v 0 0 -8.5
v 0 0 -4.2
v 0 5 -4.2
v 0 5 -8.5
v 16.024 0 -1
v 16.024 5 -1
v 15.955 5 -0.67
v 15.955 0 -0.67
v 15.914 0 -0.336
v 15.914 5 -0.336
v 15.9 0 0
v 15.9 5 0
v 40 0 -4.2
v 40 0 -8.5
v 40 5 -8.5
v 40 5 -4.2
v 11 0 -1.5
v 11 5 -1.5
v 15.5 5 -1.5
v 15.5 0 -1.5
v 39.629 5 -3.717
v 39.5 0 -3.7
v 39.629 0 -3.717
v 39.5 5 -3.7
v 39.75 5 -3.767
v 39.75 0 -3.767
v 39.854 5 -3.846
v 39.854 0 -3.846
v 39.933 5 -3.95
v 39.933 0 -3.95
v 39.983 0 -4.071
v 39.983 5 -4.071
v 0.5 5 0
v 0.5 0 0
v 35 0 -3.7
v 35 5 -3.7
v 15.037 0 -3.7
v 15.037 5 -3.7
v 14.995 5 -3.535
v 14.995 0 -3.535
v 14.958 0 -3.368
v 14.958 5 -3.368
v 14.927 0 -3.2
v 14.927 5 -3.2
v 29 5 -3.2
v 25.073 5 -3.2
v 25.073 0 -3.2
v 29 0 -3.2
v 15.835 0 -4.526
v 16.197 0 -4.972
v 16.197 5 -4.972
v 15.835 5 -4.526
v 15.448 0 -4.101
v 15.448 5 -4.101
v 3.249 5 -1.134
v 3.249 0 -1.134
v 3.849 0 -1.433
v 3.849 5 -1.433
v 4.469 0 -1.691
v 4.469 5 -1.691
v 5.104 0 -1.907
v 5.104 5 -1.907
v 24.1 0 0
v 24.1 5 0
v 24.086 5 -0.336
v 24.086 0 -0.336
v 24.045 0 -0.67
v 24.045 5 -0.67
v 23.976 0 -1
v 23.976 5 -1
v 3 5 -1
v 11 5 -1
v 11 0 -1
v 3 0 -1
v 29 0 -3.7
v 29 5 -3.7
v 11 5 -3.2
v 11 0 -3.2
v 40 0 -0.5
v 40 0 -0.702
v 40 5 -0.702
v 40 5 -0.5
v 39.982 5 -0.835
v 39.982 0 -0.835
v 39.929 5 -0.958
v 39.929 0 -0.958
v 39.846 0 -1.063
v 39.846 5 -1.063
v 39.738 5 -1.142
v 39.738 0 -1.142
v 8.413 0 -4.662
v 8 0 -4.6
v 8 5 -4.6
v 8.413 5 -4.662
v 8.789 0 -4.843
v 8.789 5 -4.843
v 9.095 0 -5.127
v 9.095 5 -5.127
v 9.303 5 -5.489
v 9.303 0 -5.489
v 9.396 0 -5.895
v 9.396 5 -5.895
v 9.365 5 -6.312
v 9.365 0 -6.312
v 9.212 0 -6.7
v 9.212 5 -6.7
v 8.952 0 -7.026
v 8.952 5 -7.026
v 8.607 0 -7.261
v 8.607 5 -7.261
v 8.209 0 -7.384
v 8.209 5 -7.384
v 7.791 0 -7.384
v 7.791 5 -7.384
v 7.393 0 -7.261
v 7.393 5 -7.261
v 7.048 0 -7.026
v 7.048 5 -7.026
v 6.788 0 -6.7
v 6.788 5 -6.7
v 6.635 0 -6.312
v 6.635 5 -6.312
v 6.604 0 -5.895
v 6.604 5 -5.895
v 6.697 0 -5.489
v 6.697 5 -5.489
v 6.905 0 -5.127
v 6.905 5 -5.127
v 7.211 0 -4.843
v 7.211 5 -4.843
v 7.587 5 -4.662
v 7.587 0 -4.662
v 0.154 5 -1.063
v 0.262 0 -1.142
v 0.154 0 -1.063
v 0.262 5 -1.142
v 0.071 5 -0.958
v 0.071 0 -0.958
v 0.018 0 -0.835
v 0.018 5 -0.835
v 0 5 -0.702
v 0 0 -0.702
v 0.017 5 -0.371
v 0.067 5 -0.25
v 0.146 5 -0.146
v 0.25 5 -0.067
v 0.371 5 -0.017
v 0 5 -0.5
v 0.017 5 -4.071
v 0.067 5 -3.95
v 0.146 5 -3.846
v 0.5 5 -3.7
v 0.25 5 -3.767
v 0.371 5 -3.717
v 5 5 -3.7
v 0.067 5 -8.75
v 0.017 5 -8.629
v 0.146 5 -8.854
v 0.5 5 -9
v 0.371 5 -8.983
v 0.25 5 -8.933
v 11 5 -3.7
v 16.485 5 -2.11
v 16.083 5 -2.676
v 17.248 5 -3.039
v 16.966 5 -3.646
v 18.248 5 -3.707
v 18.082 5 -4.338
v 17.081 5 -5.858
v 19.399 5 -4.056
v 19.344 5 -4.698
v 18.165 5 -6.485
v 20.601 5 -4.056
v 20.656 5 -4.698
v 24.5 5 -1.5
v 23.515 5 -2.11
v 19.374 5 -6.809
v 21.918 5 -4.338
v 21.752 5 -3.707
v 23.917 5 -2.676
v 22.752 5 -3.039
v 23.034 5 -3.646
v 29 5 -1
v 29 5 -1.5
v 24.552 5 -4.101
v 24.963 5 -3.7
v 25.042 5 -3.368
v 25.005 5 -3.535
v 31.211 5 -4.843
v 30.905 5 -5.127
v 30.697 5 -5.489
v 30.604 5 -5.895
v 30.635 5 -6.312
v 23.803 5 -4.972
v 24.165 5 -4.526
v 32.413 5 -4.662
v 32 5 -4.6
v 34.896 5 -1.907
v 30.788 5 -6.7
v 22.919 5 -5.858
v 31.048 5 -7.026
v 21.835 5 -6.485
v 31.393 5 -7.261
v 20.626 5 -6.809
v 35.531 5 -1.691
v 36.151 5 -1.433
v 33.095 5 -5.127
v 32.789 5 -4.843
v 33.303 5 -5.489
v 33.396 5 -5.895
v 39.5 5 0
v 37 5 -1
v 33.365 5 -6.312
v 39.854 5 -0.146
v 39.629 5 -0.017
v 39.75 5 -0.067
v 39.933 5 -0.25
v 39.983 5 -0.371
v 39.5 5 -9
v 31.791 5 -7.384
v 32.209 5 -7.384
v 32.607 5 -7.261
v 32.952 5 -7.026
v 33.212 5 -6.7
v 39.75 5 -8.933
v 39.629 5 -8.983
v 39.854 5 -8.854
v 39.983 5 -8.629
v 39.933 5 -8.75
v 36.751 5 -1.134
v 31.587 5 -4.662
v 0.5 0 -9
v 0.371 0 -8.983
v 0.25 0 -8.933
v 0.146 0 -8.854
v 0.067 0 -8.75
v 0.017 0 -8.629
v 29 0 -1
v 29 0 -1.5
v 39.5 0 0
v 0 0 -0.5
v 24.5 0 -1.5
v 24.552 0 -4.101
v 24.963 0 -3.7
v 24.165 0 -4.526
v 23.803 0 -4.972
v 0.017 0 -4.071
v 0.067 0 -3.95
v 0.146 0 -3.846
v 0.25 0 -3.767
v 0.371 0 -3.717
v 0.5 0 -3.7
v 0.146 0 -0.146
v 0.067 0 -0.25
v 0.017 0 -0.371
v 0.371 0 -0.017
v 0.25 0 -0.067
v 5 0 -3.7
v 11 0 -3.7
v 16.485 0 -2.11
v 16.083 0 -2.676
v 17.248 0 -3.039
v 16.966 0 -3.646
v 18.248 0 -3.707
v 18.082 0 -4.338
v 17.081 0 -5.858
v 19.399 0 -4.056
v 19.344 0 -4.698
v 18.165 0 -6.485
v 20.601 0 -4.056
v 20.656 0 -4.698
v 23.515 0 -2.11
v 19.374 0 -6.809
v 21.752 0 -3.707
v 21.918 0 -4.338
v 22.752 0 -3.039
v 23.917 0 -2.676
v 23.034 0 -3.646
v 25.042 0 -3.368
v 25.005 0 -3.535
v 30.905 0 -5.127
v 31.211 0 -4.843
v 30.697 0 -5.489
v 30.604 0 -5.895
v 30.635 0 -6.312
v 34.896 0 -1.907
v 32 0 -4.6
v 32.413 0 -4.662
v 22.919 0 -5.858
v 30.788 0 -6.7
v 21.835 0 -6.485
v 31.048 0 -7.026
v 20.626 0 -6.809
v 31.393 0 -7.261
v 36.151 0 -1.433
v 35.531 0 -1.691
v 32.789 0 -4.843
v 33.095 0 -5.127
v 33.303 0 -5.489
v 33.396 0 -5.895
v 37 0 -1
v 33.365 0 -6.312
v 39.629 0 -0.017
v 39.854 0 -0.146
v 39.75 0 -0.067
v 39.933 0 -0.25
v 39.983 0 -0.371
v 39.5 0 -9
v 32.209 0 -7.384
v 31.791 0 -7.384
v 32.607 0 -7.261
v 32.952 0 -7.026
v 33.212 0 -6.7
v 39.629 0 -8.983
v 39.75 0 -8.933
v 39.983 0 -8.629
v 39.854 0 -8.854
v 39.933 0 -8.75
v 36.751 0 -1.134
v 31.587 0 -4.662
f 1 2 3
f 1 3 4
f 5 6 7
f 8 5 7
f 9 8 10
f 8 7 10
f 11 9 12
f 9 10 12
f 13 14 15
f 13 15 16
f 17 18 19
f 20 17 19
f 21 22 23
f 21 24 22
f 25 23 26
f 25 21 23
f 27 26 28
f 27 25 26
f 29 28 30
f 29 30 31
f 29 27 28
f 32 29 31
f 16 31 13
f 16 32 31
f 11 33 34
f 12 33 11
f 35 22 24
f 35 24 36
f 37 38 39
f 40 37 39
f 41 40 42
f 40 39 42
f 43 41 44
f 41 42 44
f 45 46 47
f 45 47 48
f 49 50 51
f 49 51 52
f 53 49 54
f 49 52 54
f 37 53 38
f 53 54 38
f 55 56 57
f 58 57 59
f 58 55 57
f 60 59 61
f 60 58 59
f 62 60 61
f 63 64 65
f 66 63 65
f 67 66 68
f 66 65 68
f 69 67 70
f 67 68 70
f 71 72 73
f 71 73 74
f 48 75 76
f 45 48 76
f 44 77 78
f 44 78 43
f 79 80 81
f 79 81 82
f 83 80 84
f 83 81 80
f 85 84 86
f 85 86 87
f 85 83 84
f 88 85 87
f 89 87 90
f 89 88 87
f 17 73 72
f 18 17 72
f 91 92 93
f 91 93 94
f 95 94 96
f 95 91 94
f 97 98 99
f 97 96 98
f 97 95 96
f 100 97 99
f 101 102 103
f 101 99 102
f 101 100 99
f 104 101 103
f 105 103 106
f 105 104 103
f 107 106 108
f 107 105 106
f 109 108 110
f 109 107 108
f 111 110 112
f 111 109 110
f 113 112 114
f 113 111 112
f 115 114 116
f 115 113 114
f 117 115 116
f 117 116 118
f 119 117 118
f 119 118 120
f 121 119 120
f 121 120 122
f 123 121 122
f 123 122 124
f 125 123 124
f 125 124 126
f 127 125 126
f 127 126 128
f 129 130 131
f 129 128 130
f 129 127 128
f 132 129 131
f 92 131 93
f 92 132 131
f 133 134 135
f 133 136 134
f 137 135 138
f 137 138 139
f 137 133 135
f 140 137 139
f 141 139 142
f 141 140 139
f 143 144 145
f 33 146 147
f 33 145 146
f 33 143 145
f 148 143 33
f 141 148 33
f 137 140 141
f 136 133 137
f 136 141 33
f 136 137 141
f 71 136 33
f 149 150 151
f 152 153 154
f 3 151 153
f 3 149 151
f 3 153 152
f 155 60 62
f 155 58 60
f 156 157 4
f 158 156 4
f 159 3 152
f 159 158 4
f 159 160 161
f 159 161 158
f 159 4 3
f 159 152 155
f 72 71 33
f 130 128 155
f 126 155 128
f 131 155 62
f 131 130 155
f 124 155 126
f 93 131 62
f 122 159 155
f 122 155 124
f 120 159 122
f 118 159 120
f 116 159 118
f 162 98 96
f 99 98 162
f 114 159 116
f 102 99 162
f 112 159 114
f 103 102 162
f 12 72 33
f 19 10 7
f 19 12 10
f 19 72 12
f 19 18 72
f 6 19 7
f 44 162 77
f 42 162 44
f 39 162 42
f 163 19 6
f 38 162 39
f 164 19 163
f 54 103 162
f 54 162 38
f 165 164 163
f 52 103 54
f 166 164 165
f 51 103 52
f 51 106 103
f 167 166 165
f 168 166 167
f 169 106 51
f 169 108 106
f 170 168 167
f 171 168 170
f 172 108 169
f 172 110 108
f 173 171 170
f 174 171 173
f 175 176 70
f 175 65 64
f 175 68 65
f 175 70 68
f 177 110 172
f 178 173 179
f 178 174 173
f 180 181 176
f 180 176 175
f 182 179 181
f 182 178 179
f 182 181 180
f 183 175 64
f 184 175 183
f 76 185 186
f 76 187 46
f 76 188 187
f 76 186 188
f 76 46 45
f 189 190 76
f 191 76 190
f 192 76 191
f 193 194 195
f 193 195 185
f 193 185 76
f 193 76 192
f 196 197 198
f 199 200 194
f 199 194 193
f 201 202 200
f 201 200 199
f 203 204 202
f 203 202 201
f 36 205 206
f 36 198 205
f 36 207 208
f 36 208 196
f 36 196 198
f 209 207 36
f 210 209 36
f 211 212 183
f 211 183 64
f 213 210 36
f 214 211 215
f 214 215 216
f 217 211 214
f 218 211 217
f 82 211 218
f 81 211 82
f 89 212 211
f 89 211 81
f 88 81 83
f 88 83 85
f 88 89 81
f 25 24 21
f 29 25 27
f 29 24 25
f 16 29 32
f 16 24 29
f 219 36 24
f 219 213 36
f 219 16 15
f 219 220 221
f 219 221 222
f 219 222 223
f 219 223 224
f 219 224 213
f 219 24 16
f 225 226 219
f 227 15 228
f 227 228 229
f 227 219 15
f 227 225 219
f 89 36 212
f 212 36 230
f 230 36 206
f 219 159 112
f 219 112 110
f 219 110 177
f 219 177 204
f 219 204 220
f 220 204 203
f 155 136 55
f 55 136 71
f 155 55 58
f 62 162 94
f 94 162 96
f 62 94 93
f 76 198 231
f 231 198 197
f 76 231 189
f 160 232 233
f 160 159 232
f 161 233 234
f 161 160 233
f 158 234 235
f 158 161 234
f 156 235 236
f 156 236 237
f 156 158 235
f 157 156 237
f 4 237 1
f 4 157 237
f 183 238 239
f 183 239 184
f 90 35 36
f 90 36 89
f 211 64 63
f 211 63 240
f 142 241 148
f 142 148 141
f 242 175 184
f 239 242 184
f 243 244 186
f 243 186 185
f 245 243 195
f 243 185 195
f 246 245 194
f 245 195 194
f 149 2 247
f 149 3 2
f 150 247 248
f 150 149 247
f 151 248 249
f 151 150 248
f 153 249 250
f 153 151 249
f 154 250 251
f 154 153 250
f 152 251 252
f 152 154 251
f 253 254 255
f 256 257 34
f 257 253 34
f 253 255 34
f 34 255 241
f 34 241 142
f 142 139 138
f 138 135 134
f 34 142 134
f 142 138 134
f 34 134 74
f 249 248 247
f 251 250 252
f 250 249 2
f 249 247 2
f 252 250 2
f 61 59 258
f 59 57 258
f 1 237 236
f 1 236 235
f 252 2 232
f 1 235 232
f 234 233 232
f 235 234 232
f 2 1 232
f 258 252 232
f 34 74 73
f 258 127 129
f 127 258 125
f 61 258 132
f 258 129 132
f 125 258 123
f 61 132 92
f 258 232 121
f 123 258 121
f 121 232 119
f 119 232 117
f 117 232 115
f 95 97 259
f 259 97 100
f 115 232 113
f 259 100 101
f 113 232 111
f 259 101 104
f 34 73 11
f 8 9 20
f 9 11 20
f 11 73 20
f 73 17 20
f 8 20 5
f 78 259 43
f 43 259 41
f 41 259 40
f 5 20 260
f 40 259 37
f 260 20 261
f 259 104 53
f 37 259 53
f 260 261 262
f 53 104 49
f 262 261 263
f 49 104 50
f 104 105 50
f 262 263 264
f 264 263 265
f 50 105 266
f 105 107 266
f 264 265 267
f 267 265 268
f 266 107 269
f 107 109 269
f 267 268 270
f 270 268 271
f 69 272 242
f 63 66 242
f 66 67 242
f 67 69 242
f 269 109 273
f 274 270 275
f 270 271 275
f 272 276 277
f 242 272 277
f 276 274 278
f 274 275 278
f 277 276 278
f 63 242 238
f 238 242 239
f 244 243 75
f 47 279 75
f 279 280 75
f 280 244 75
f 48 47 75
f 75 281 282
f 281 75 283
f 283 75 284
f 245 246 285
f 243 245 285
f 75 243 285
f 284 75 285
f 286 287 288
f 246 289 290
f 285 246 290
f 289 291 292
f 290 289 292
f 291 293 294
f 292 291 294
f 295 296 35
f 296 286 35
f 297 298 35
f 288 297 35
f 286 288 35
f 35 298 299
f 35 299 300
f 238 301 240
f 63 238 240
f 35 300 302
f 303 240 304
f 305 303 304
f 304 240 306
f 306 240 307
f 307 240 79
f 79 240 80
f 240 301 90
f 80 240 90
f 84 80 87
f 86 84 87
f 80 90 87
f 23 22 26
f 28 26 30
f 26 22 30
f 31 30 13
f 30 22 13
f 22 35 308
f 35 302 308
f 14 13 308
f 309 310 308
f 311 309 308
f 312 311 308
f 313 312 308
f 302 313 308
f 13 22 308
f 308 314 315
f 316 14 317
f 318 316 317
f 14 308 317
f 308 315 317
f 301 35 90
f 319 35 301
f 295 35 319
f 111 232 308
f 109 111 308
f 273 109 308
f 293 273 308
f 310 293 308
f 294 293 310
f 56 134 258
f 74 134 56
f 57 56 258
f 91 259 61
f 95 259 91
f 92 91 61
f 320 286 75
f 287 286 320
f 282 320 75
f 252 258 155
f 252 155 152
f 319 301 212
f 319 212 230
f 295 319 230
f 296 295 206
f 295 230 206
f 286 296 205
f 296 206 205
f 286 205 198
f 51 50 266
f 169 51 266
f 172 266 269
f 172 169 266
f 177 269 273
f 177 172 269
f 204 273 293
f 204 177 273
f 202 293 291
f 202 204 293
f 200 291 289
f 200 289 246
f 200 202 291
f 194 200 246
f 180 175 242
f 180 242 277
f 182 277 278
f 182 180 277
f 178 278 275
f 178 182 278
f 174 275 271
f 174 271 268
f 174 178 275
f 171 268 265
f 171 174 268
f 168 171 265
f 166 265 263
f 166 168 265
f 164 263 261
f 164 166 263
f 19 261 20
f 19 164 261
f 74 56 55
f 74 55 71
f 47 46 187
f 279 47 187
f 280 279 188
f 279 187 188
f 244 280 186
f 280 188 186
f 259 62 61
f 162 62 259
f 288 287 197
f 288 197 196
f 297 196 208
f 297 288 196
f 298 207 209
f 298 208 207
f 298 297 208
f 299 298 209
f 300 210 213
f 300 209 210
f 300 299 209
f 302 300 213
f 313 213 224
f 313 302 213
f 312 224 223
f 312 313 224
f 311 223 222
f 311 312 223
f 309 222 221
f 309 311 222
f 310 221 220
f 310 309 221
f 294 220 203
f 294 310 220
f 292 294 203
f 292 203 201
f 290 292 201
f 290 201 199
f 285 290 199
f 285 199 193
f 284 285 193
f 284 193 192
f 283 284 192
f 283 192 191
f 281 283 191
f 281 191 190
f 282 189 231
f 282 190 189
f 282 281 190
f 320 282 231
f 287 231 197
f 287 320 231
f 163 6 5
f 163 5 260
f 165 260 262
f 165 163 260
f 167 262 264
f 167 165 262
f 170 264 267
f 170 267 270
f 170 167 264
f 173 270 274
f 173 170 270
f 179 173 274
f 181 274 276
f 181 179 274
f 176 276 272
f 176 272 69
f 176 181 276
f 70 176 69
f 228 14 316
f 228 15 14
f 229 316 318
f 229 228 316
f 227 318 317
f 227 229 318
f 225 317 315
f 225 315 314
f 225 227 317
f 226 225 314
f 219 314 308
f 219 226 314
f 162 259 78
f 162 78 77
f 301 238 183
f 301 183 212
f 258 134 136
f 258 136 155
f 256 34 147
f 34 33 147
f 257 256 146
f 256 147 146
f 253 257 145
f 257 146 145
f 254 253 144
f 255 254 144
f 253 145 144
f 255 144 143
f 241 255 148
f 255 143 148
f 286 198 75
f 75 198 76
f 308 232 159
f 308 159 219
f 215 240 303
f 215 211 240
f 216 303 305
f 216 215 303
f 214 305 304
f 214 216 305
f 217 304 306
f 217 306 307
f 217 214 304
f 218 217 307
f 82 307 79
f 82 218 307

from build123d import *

# Parameters (mm, degrees)
BOSS_EXTRUDE1_DEPTH     = 5
CUT_EXTRUDE1_DEPTH      = 5
CUT_EXTRUDE1_DEPTH_BACK = 10
SKETCH2_R               = 1.4
FILLET1_R               = 10
FILLET2_R               = 0.5
CUT_EXTRUDE3_DEPTH      = 7
SKETCH6_W               = 4.5
SKETCH6_H               = 5
BOSS_EXTRUDE2_DEPTH     = 0.5
SKETCH7_W               = 9
SKETCH7_H               = 1
BOSS_EXTRUDE3_DEPTH     = 5
BOSS_EXTRUDE4_DEPTH     = 5
CUT_EXTRUDE5_START      = 5
SKETCH11_R              = 4.1
CUT_EXTRUDE5_DEPTH      = 5
CUT_EXTRUDE7_DEPTH      = 5
FILLET3_R               = 10


with BuildPart() as part:
    # Sketch1 → Boss-Extrude1 (new body)
    with BuildSketch(Plane(origin=(0, 0, 0), x_dir=(1, 0, 0), z_dir=(0, 1, 0))):
        Polygon((0, 0), (0, 9), (40, 9), (40, 0), (24, 0), (24, 5), (16, 5), (16, 0), align=None)
    extrude(amount=BOSS_EXTRUDE1_DEPTH)

    # Sketch2 → Cut-Extrude1 (cut, two sides: drawn at the far end of the back side and taken through both)
    with BuildSketch(Plane(origin=(0, 5, 0), x_dir=(1, 0, 0), z_dir=(0, 1, 0)).offset(-CUT_EXTRUDE1_DEPTH_BACK)):
        with Locations(Location((8, 6, 0), (0, 0, 270))):
            Circle(SKETCH2_R)
        with Locations(Location((32, 6, 0), (0, 0, 270))):
            Circle(SKETCH2_R)
        Polygon((5, 3.7), (0, 3.7), (0, 1), align=None)
        Polygon((13, 1), (8, 3.7), (3, 1), align=None)
        Polygon((16, 3.7), (11, 3.7), (16, 1), align=None)
        Polygon((24, 3.7), (24, 1), (29, 3.7), align=None)
        Polygon((32, 3.7), (27, 1), (37, 1), align=None)
        Polygon((40, 3.7), (35, 3.7), (40, 1), align=None)
    extrude(amount=CUT_EXTRUDE1_DEPTH + CUT_EXTRUDE1_DEPTH_BACK, mode=Mode.SUBTRACT)

    # Fillet1
    fillet1_edges = [part.edges().sort_by_distance(p)[0] for p in [
        (32, 2.5, -3.7),
        (8, 2.5, -3.7),
    ]]
    fillet(fillet1_edges, radius=FILLET1_R)

    # Fillet2
    fillet2_edges = [part.edges().sort_by_distance(p)[0] for p in [
        (0, 2.5, 0),
        (0, 2.5, -9),
        (40, 2.5, -9),
        (40, 2.5, 0),
        (24, 2.5, 0),
        (24, 2.5, -5),
        (16, 2.5, -5),
        (16, 2.5, 0),
        (0, 2.5, -1),
        (0, 2.5, -3.7),
        (16, 2.5, -3.7),
        (16, 2.5, -1),
        (24, 2.5, -3.7),
        (24, 2.5, -1),
        (40, 2.5, -3.7),
        (40, 2.5, -1),
    ]]
    fillet(fillet2_edges, radius=FILLET2_R)

    # Sketch4 → Cut-Extrude3 (cut)
    with BuildSketch(Plane(origin=(0, 5, 0), x_dir=(1, 0, 0), z_dir=(0, 1, 0))):
        Polygon((10.483197095, 1), (8, 2.335141884), (5.076146091, 1.898147599), (11, 3.7), (16.021662669, 1), align=None)
        Polygon((29.516802905, 1), (32, 2.335141884), (34.923853909, 1.898147599), (29, 3.7), (23.978337331, 1), align=None)
    extrude(amount=-CUT_EXTRUDE3_DEPTH, mode=Mode.SUBTRACT)

    # Sketch6 → Boss-Extrude2 (add)
    with BuildSketch(Plane.XY.offset(-3.7)):
        with Locations((13.25, 2.5)):
            Rectangle(SKETCH6_W, SKETCH6_H)
        with Locations((26.75, 2.5)):
            Rectangle(SKETCH6_W, SKETCH6_H)
    boss_extrude2 = extrude(amount=BOSS_EXTRUDE2_DEPTH)

    # Mirror1: Boss-Extrude2 across plane
    add(boss_extrude2.mirror(Plane.XY.offset(-2.35)))

    # Sketch7 → Boss-Extrude3 (add)
    with BuildSketch(Plane(origin=(0, 5, 0), x_dir=(1, 0, 0), z_dir=(0, 1, 0))):
        with Locations((20, 0.5)):
            Rectangle(SKETCH7_W, SKETCH7_H)
    extrude(amount=-BOSS_EXTRUDE3_DEPTH)

    # Sketch9 → Boss-Extrude4 (add)
    with BuildSketch(Plane(origin=(0, 5, 0), x_dir=(1, 0, 0), z_dir=(0, 1, 0))):
        with BuildLine():
            ThreePointArc((16.02382093, 1), (20, 4.1), (23.97617907, 1))
            Line((23.97617907, 1), (24.5, 1))
            Line((24.5, 1), (24.5, 1.5))
            ThreePointArc((24.5, 1.5), (20, 4.74341649), (15.5, 1.5))
            Line((15.5, 1.5), (15.5, 1))
            Line((15.5, 1), (16.02382093, 1))
        make_face()
    extrude(amount=-BOSS_EXTRUDE4_DEPTH)

    # Sketch11 → Cut-Extrude5 (cut)
    with BuildSketch(Plane(origin=(0, 0, 0), x_dir=(1, 0, 0), z_dir=(0, 1, 0)).offset(CUT_EXTRUDE5_START)):
        with Locations((20, 0)):
            Circle(SKETCH11_R)
    extrude(amount=-CUT_EXTRUDE5_DEPTH, mode=Mode.SUBTRACT)

    # Sketch10 → Cut-Extrude7 (cut)
    with BuildSketch(Plane(origin=(0, 5, 0), x_dir=(1, 0, 0), z_dir=(0, 1, 0))):
        with BuildLine():
            ThreePointArc((15.5, 3.7), (20, 6.85), (24.5, 3.7))
            ThreePointArc((24.5, 3.7), (24.146446609, 3.846446609), (24, 4.2))
            Line((24, 4.2), (24, 4.5))
            ThreePointArc((24, 4.5), (23.853553391, 4.853553391), (23.5, 5))
            Line((23.5, 5), (16.5, 5))
            ThreePointArc((16.5, 5), (16.146446609, 4.853553391), (16, 4.5))
            Line((16, 4.5), (16, 4.2))
            ThreePointArc((16, 4.2), (15.853553391, 3.846446609), (15.5, 3.7))
        make_face()
        with BuildLine():
            Line((24.963087063, 3.7), (24.5, 3.7))
            Line((24.5, 3.7), (24.5, 3.2))
            Line((24.5, 3.2), (25.072694865, 3.2))
            ThreePointArc((25.072694865, 3.2), (25.02411482, 3.451364366), (24.963087063, 3.7))
        make_face()
        with BuildLine():
            Line((15.5, 3.2), (15.5, 3.7))
            Line((15.5, 3.7), (15.036912937, 3.7))
            ThreePointArc((15.036912937, 3.7), (14.97588518, 3.451364366), (14.927305135, 3.2))
            Line((14.927305135, 3.2), (15.5, 3.2))
        make_face()
        with BuildLine():
            Line((15.5, 3.7), (16.031107798, 3.7))
            Line((16.031107798, 3.7), (16.5, 5))
            ThreePointArc((16.5, 5), (16.146446609, 4.853553391), (16, 4.5))
            Line((16, 4.5), (16, 4.2))
            ThreePointArc((16, 4.2), (15.853553391, 3.846446609), (15.5, 3.7))
        make_face()
        with BuildLine():
            Line((24.195310158, 3.7), (24.5, 3.7))
            ThreePointArc((24.5, 3.7), (24.146446609, 3.846446609), (24, 4.2))
            Line((24, 4.2), (24, 4.5))
            ThreePointArc((24, 4.5), (23.853553391, 4.853553391), (23.5, 5))
            Line((23.5, 5), (23.319457032, 5))
            Line((23.319457032, 5), (24.195310158, 3.7))
        make_face()
    extrude(amount=-CUT_EXTRUDE7_DEPTH, mode=Mode.SUBTRACT)

    # Fillet3
    # the kernel refuses this fillet: 10 mm, written as the material it takes off along each edge
    with BuildSketch(Plane(origin=(15.5, 8.6255598, -3.7), x_dir=(-1, 0, 0), z_dir=(0, -1, 0))) as fillet3_piece_1:
        with BuildLine():
            CenterArc((7.243737761, 7.350018783), FILLET3_R, 217.432435618, 9.874939203)
            Line((-0.696968767, 1.271764112), (-0.855782897, 1.150199019))
            ThreePointArc((-0.855782897, 1.150199019), (-0.475456762, 0.566296996), (-0.187919463, -0.068456376))
            Line((-0.187919463, -0.068456376), (0, -0.2))
            ThreePointArc((0, -0.2), (0.231543531, -0.2), (0.327474049, -0.147000376))
            Line((0.327474049, -0.147000376), (0.463087063, 0))
        make_face()
    extrude(amount=12.251119601, mode=Mode.SUBTRACT)
    with BuildSketch(Plane(origin=(24.5, 8.6255598, -3.7), x_dir=(-0.4805938979656583, 0, -0.8769432736717777), z_dir=(0, -1, 0))) as fillet3_piece_2:
        with BuildLine():
            CenterArc((2.964253367, 9.884721283), FILLET3_R, 251.41682279, 9.874939203)
            Line((-0.222556817, 0.406101085), (-0.28629302, 0.216528681))
            ThreePointArc((-0.28629302, 0.216528681), (-0.286667063, 0.106931763), (-0.175388655, -0.09611878))
            Line((-0.175388655, -0.09611878), (0.030280589, -0.197694426))
            ThreePointArc((0.030280589, -0.197694426), (0.72511196, -0.144789729), (1.419943331, -0.197694426))
            Line((1.419943331, -0.197694426), (1.45022392, 0))
        make_face()
    extrude(amount=12.251119601, mode=Mode.SUBTRACT)


solid = part.part
